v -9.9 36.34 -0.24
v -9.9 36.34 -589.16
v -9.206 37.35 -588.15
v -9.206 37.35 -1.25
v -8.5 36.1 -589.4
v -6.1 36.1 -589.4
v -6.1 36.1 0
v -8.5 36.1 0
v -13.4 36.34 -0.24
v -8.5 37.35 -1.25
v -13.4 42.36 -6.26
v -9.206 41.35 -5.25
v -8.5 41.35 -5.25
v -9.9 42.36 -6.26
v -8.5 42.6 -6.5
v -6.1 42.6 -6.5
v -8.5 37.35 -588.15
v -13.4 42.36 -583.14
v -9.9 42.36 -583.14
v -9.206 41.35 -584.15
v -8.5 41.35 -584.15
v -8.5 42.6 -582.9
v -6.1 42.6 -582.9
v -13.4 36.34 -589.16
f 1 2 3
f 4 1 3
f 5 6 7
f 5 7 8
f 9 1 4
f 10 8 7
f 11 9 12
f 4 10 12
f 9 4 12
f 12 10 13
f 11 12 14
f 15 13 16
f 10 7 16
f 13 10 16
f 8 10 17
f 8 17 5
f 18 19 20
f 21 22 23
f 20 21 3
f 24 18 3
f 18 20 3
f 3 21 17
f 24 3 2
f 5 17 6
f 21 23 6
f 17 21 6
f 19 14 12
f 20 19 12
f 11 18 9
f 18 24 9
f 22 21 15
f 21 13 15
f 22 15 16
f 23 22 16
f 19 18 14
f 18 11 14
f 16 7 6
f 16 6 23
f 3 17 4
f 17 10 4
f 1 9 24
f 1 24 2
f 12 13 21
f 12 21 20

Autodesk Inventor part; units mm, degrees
ref_plane "YZ Plane" through (0, 0, 0) normal (1, 0, 0) x (0, 1, 0)
ref_plane "XZ Plane" through (0, 0, 0) normal (0, 1, 0) x (-1, 0, 0)
sketch "Sketch1" plane through (0, 0, 0) normal (0, 0, 1) x (1, 0, 0)
  line L0 (-8.5, 42.6) -> (-6.1, 42.6)
  line L1 (-6.1, 36.1) -> (-8.5, 36.1)
  line L2 (-6.1, 36.1) -> (-6.1, 42.6)
  line L3 (-8.5, 37.35) -> (-8.5, 36.1)
  line L4 (-8.5, 41.35) -> (-8.5, 42.6)
  line L5 (-8.5, 37.35) -> (-9.2058, 37.35)
  line L6 (-8.5, 41.35) -> (-9.2058, 41.35)
  line L7 (-9.9, 42.36) -> (-9.2058, 41.35)
  line L8 (-9.9, 36.34) -> (-9.2058, 37.35)
  line L9 (-13.4, 36.34) -> (-9.9, 36.34)
  line L10 (-13.4, 36.34) -> (-13.4, 42.36)
  line L11 (-13.4, 42.36) -> (-9.9, 42.36)
  point P0 (-8.5, 41.975)
  point P1 (-6.1, 39.35)
  dimension "d27" = 6.5
  dimension "d28" = 2.4
  dimension "d29" = 2.4
  dimension "d35" = 111
  dimension "d36" = 4
  dimension "d37" = 6.02
  dimension "d38" = 0.7058
  dimension "d39" = 0.7058
  dimension "d43" = 3.01
  dimension "d44" = 2
  dimension "d63" = 3.5
  dimension "d64" = 3.5
extrude "Extrusion1" add sketch "Sketch1" against normal blind 589.4
ref_plane "Plano de trabajo3" through (0, 0, -294.7) normal (0, 0, 1) x (1, 0, 0)
sketch "Boceto2" plane through (-6.1, 36.1, 0) normal (1, 0, 0) x (0, 0, -1)
  line L0 (0, 0) -> (6.5, 6.5)
  line L1 (0, 6.5) -> (589.4, 6.5) projected
  line L2 (6.5, 6.5) -> (0, 6.5)
  line L3 (6.5, 6.5) -> (0, 6.5)
  line L4 (0, 0) -> (0, 6.5) projected
  line L5 (0, 0) -> (0, 6.5)
  point P0 (0, -36.1)
  dimension "d65" = 45
extrude "Extrusión3" cut sketch "Boceto2" against normal through all
mirror "Simetría3" about plane through (0, 0, -294.7) normal (0, 0, 1) of "Extrusión3"
properties part number "SP40-02 JUNTA INT 589 mm" material "Rubber"
